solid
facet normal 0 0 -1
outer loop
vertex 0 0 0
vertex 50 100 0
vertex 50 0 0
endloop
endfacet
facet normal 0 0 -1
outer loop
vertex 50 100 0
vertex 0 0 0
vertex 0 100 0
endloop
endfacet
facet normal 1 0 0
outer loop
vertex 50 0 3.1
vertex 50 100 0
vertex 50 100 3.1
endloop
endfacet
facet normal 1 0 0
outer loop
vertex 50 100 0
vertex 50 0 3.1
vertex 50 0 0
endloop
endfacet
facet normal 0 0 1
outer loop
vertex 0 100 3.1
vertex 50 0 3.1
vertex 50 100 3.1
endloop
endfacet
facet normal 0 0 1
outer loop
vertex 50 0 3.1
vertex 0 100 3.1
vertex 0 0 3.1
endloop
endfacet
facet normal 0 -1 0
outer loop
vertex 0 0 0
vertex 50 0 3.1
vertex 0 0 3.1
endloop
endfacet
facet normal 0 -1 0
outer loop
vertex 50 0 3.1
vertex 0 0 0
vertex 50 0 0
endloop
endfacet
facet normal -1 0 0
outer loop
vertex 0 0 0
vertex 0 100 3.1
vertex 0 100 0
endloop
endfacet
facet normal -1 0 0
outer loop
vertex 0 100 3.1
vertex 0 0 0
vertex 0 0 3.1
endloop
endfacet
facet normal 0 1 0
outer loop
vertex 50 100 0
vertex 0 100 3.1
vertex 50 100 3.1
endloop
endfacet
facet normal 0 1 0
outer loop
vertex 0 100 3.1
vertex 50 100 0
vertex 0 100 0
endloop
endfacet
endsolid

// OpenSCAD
include <../lasercut.scad>; 

thickness = 3.1;
x = 50;
y = 100;
lasercutoutSquare(thickness=thickness, x=x, y=y);
